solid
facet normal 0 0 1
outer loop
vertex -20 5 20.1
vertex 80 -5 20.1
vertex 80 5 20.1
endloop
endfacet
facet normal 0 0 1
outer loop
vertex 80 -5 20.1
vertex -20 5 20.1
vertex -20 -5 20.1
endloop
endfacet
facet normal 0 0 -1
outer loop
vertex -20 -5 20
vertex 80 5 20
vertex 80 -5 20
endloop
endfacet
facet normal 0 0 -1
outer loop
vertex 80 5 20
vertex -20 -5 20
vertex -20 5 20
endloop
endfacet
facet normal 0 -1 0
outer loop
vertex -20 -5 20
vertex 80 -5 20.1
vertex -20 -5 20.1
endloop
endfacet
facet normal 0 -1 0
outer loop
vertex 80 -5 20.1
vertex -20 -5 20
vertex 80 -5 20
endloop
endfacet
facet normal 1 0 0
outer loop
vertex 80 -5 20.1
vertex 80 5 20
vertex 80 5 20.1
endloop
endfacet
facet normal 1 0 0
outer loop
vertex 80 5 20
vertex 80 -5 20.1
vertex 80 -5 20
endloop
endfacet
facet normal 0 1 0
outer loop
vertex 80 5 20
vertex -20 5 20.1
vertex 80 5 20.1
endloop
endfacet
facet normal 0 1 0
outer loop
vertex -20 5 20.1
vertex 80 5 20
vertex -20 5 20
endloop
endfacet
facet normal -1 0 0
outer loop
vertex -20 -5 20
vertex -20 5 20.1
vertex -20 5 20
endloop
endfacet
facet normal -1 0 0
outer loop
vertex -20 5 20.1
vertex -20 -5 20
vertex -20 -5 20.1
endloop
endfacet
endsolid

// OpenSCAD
// a window stopper with rotating wedge
// (all sizes in millimeter)

module window_stopper(

    /* parameters */
    
    window_thickness = 10,   // thickness of window frame
    windowsill_dist = 20,        // distance between window and windowsill
    
) {
    
    $fn = 10;
    
    module window() {
        color("LightSkyBlue")
        translate( [ -20, -window_thickness / 2, windowsill_dist])
            cube( [100, window_thickness, 0.1]);
        }
    
    module stopper_case() {}
    
    module stopper() {}
    
    window();
    stopper_case();
    stopper();
    
}

window_stopper( /* parameters */ );
